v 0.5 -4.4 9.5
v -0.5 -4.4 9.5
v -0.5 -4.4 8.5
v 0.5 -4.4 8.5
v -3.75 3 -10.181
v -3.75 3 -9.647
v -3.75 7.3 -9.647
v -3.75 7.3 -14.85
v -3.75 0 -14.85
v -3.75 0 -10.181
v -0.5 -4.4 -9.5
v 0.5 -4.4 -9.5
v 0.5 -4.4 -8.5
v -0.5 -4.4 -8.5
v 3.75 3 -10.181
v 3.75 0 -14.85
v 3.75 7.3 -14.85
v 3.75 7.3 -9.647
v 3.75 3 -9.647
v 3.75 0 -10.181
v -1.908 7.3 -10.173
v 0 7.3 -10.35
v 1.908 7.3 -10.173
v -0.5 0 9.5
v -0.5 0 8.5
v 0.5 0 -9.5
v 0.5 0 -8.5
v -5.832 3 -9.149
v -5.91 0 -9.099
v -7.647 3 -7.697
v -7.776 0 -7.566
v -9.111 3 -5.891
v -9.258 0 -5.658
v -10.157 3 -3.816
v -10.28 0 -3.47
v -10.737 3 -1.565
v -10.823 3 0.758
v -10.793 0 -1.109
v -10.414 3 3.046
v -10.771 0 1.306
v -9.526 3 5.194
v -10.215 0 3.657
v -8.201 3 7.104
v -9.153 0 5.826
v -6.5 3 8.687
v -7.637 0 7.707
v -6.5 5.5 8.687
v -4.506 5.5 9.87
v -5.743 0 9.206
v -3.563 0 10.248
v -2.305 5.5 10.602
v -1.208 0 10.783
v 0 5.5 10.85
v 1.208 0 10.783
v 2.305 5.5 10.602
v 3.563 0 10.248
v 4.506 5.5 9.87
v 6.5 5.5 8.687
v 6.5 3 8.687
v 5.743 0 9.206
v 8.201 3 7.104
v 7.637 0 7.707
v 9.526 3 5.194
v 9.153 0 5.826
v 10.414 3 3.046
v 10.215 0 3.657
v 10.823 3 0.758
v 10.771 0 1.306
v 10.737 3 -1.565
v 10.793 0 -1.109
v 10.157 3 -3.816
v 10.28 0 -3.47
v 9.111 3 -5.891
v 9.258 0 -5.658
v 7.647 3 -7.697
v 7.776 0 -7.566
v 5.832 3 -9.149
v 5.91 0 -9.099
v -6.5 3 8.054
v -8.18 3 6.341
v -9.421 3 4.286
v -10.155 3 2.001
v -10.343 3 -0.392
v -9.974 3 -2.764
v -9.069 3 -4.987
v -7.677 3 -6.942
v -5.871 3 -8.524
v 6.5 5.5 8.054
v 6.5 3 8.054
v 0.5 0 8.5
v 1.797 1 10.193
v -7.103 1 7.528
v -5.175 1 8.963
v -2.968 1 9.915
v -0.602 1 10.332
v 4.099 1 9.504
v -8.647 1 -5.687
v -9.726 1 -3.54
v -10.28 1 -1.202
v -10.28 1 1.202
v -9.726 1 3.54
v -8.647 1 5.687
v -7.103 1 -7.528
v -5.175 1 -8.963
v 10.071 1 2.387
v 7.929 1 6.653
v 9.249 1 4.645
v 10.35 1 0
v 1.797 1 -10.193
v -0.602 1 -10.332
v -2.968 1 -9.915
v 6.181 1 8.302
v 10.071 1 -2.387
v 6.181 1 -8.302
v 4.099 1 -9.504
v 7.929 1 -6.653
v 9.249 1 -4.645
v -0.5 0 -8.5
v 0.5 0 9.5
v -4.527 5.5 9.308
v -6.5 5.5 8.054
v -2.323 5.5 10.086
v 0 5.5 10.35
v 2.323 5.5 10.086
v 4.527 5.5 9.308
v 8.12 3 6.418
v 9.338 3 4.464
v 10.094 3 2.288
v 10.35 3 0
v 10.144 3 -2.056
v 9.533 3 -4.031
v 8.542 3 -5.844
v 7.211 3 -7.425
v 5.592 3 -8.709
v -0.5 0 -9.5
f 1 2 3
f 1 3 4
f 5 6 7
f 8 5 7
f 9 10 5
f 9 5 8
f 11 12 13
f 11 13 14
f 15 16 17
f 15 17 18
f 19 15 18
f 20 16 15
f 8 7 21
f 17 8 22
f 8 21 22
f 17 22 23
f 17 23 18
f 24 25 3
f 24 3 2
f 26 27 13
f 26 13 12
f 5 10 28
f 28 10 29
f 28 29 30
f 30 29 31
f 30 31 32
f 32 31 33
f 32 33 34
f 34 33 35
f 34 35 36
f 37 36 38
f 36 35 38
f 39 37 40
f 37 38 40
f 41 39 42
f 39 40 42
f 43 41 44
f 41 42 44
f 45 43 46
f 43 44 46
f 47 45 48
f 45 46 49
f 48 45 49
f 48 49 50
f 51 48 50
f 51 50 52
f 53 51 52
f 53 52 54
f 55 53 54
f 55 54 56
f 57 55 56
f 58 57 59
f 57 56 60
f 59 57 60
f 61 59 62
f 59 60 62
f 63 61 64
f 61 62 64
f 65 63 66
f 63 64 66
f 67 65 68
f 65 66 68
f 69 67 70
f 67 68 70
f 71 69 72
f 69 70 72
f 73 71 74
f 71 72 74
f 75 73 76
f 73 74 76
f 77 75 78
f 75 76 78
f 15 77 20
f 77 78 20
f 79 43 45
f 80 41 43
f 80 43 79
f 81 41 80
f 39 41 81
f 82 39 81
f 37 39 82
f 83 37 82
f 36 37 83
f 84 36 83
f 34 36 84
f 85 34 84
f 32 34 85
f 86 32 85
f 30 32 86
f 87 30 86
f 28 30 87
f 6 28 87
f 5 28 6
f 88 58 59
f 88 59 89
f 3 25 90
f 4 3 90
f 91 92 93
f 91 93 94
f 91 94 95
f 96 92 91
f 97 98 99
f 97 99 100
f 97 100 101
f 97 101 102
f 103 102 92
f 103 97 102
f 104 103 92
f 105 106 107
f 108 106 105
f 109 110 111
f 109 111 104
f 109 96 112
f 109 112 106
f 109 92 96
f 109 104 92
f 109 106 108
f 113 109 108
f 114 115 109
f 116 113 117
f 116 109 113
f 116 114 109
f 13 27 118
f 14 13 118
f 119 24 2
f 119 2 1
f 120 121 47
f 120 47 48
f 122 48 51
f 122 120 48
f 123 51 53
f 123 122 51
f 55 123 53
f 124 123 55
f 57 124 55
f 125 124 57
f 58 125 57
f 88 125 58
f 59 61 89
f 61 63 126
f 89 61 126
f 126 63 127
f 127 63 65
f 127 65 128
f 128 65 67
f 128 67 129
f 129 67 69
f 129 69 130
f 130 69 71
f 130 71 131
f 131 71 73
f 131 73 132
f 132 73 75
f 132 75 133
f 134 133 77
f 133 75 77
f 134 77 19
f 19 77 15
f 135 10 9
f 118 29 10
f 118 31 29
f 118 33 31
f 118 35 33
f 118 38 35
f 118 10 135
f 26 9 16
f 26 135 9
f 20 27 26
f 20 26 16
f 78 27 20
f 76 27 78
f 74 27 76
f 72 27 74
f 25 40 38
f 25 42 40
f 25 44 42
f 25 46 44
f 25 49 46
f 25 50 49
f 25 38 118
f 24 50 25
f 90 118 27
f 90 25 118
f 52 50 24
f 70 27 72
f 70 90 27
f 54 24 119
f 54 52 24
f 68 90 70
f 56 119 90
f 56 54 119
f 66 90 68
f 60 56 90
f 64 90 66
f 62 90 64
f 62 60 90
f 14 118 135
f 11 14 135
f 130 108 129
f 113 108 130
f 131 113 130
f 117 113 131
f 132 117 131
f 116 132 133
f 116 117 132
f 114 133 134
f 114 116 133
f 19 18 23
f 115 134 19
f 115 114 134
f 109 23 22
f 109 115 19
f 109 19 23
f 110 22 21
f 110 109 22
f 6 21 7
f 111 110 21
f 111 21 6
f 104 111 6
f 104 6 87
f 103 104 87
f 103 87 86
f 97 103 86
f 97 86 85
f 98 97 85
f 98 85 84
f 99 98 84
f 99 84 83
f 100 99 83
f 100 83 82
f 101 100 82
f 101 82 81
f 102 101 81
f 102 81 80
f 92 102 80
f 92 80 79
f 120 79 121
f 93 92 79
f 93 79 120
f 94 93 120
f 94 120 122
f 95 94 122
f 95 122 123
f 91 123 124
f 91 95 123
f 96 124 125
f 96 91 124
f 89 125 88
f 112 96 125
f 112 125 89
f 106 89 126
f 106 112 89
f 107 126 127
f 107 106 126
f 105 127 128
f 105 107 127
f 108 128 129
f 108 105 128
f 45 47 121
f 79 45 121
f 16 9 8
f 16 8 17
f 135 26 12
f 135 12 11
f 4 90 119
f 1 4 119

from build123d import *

# Parameters (mm, degrees)
SKETCH1_R               = 10.85
BOSS_EXTRUDE1_DEPTH     = 1
SKETCH2_W               = 1
SKETCH2_H               = 1
BOSS_EXTRUDE2_DEPTH     = 4.4
CIRPATTERN1_COUNT       = 2
SKETCH3_R               = 10.85
SKETCH3_R_2             = 10.35
BOSS_EXTRUDE3_DEPTH     = 6.3
CUT_EXTRUDE1_DEPTH      = 1.8
CUT_EXTRUDE4_DEPTH      = 2.8
CUT_EXTRUDE4_DEPTH_BACK = 2.5
BOSS_EXTRUDE4_DEPTH     = 7.3


with BuildPart() as part:
    # Sketch1 → Boss-Extrude1 (new body)
    with BuildSketch(Plane(origin=(0, 0, 0), x_dir=(1, 0, 0), z_dir=(0, 1, 0))):
        Circle(SKETCH1_R)
    extrude(amount=BOSS_EXTRUDE1_DEPTH)

    # Sketch2 → Boss-Extrude2 (add)
    with BuildSketch(Plane.XZ):
        with Locations((0, 9)):
            Rectangle(SKETCH2_W, SKETCH2_H)
    boss_extrude2 = extrude(amount=BOSS_EXTRUDE2_DEPTH)

    # CirPattern1: Boss-Extrude2 ×2 about axis
    cirpattern1_axis = Axis((0, 0, 0), (0, 1, 0))
    for i in range(1, CIRPATTERN1_COUNT):
        add(boss_extrude2.rotate(cirpattern1_axis, i * 360 / CIRPATTERN1_COUNT))

    # Sketch3 → Boss-Extrude3 (add)
    with BuildSketch(Plane(origin=(0, 1, 0), x_dir=(1, 0, 0), z_dir=(0, 1, 0))):
        Circle(SKETCH3_R)
        Circle(SKETCH3_R_2, mode=Mode.SUBTRACT)
    extrude(amount=BOSS_EXTRUDE3_DEPTH)

    # Sketch4 → Cut-Extrude1 (cut)
    with BuildSketch(Plane(origin=(0, 7.3, 0), x_dir=(1, 0, 0), z_dir=(0, 1, 0))):
        with BuildLine():
            Line((-3.75, 9.646761114), (-3.75, 10.181355509))
            ThreePointArc((-3.75, 10.181355509), (0, -10.85), (3.75, 10.181355509))
            Line((3.75, 10.181355509), (3.75, 9.646761114))
            ThreePointArc((3.75, 9.646761114), (0, -10.35), (-3.75, 9.646761114))
        make_face()
    extrude(amount=-CUT_EXTRUDE1_DEPTH, mode=Mode.SUBTRACT)

    # Sketch7 → Cut-Extrude4 (cut, two sides)
    with BuildSketch(Plane(origin=(0, 5.5, 0), x_dir=(1, 0, 0), z_dir=(0, 1, 0))) as cut_extrude4_sk:
        with BuildLine():
            Line((-6.5, -8.687491007), (-6.5, -8.054346653))
            ThreePointArc((-6.5, -8.054346653), (-10.227312895, 1.58888985), (-3.75, 9.646761114))
            Line((-3.75, 9.646761114), (-3.75, 10.181355509))
            ThreePointArc((-3.75, 10.181355509), (-10.736571483, 1.56477883), (-6.5, -8.687491007))
        make_face()
        with BuildLine():
            Line((6.5, -8.687491007), (6.5, -8.054346653))
            ThreePointArc((6.5, -8.054346653), (10.227312895, 1.58888985), (3.75, 9.646761114))
            Line((3.75, 9.646761114), (3.75, 10.181355509))
            ThreePointArc((3.75, 10.181355509), (10.736571483, 1.56477883), (6.5, -8.687491007))
        make_face()
    extrude(amount=CUT_EXTRUDE4_DEPTH, mode=Mode.SUBTRACT)
    extrude(cut_extrude4_sk.sketch, amount=-CUT_EXTRUDE4_DEPTH_BACK, mode=Mode.SUBTRACT)

    # Sketch8 → Boss-Extrude4 (add)
    with BuildSketch(Plane.XZ):
        with BuildLine():
            Line((-3.75, -10.181355509), (-3.75, -14.85))
            Line((-3.75, -14.85), (3.75, -14.85))
            Line((3.75, -14.85), (3.75, -10.181355509))
            ThreePointArc((3.75, -10.181355509), (0, -10.85), (-3.75, -10.181355509))
        make_face()
    extrude(amount=-BOSS_EXTRUDE4_DEPTH)


solid = part.part
